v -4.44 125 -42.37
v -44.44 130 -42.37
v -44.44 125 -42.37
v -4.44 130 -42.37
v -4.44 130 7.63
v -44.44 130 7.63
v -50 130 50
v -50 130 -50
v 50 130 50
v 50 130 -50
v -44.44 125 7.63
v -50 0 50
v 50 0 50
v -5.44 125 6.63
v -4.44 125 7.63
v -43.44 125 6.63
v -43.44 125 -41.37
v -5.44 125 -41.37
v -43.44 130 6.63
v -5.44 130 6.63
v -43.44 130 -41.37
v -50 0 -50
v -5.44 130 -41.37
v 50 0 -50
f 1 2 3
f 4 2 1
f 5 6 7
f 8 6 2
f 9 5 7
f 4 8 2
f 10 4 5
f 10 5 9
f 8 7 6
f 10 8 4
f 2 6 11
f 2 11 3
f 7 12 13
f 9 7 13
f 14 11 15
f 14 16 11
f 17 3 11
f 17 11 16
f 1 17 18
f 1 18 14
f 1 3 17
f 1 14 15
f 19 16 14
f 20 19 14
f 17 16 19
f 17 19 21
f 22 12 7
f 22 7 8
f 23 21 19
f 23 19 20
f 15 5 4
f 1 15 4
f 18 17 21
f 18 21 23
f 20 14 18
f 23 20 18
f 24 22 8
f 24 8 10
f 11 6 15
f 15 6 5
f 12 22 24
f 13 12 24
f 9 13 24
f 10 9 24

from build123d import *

# Parameters (mm, degrees)
SKETCH1_W           = 100
SKETCH1_H           = 100
BOSS_EXTRUDE1_DEPTH = 130
SKETCH2_W           = 40
SKETCH2_H           = 50
CUT_EXTRUDE1_DEPTH  = 5
SKETCH3_W           = 38
SKETCH3_H           = 48
BOSS_EXTRUDE2_DEPTH = 5


with BuildPart() as part:
    # Sketch1 → Boss-Extrude1 (new body)
    with BuildSketch(Plane(origin=(0, 0, 0), x_dir=(1, 0, 0), z_dir=(0, 1, 0))):
        Rectangle(SKETCH1_W, SKETCH1_H)
    extrude(amount=BOSS_EXTRUDE1_DEPTH)

    # Sketch2 → Cut-Extrude1 (cut)
    with BuildSketch(Plane(origin=(0, 130, 0), x_dir=(1, 0, 0), z_dir=(0, 1, 0))):
        with Locations((-24.43959223, 17.370310973)):
            Rectangle(SKETCH2_W, SKETCH2_H)
    extrude(amount=-CUT_EXTRUDE1_DEPTH, mode=Mode.SUBTRACT)

    # Sketch3 → Boss-Extrude2 (add)
    with BuildSketch(Plane(origin=(0, 125, 0), x_dir=(1, 0, 0), z_dir=(0, 1, 0))):
        with Locations((-24.43959223, 17.370310973)):
            Rectangle(SKETCH3_W, SKETCH3_H)
    extrude(amount=BOSS_EXTRUDE2_DEPTH)


solid = part.part
